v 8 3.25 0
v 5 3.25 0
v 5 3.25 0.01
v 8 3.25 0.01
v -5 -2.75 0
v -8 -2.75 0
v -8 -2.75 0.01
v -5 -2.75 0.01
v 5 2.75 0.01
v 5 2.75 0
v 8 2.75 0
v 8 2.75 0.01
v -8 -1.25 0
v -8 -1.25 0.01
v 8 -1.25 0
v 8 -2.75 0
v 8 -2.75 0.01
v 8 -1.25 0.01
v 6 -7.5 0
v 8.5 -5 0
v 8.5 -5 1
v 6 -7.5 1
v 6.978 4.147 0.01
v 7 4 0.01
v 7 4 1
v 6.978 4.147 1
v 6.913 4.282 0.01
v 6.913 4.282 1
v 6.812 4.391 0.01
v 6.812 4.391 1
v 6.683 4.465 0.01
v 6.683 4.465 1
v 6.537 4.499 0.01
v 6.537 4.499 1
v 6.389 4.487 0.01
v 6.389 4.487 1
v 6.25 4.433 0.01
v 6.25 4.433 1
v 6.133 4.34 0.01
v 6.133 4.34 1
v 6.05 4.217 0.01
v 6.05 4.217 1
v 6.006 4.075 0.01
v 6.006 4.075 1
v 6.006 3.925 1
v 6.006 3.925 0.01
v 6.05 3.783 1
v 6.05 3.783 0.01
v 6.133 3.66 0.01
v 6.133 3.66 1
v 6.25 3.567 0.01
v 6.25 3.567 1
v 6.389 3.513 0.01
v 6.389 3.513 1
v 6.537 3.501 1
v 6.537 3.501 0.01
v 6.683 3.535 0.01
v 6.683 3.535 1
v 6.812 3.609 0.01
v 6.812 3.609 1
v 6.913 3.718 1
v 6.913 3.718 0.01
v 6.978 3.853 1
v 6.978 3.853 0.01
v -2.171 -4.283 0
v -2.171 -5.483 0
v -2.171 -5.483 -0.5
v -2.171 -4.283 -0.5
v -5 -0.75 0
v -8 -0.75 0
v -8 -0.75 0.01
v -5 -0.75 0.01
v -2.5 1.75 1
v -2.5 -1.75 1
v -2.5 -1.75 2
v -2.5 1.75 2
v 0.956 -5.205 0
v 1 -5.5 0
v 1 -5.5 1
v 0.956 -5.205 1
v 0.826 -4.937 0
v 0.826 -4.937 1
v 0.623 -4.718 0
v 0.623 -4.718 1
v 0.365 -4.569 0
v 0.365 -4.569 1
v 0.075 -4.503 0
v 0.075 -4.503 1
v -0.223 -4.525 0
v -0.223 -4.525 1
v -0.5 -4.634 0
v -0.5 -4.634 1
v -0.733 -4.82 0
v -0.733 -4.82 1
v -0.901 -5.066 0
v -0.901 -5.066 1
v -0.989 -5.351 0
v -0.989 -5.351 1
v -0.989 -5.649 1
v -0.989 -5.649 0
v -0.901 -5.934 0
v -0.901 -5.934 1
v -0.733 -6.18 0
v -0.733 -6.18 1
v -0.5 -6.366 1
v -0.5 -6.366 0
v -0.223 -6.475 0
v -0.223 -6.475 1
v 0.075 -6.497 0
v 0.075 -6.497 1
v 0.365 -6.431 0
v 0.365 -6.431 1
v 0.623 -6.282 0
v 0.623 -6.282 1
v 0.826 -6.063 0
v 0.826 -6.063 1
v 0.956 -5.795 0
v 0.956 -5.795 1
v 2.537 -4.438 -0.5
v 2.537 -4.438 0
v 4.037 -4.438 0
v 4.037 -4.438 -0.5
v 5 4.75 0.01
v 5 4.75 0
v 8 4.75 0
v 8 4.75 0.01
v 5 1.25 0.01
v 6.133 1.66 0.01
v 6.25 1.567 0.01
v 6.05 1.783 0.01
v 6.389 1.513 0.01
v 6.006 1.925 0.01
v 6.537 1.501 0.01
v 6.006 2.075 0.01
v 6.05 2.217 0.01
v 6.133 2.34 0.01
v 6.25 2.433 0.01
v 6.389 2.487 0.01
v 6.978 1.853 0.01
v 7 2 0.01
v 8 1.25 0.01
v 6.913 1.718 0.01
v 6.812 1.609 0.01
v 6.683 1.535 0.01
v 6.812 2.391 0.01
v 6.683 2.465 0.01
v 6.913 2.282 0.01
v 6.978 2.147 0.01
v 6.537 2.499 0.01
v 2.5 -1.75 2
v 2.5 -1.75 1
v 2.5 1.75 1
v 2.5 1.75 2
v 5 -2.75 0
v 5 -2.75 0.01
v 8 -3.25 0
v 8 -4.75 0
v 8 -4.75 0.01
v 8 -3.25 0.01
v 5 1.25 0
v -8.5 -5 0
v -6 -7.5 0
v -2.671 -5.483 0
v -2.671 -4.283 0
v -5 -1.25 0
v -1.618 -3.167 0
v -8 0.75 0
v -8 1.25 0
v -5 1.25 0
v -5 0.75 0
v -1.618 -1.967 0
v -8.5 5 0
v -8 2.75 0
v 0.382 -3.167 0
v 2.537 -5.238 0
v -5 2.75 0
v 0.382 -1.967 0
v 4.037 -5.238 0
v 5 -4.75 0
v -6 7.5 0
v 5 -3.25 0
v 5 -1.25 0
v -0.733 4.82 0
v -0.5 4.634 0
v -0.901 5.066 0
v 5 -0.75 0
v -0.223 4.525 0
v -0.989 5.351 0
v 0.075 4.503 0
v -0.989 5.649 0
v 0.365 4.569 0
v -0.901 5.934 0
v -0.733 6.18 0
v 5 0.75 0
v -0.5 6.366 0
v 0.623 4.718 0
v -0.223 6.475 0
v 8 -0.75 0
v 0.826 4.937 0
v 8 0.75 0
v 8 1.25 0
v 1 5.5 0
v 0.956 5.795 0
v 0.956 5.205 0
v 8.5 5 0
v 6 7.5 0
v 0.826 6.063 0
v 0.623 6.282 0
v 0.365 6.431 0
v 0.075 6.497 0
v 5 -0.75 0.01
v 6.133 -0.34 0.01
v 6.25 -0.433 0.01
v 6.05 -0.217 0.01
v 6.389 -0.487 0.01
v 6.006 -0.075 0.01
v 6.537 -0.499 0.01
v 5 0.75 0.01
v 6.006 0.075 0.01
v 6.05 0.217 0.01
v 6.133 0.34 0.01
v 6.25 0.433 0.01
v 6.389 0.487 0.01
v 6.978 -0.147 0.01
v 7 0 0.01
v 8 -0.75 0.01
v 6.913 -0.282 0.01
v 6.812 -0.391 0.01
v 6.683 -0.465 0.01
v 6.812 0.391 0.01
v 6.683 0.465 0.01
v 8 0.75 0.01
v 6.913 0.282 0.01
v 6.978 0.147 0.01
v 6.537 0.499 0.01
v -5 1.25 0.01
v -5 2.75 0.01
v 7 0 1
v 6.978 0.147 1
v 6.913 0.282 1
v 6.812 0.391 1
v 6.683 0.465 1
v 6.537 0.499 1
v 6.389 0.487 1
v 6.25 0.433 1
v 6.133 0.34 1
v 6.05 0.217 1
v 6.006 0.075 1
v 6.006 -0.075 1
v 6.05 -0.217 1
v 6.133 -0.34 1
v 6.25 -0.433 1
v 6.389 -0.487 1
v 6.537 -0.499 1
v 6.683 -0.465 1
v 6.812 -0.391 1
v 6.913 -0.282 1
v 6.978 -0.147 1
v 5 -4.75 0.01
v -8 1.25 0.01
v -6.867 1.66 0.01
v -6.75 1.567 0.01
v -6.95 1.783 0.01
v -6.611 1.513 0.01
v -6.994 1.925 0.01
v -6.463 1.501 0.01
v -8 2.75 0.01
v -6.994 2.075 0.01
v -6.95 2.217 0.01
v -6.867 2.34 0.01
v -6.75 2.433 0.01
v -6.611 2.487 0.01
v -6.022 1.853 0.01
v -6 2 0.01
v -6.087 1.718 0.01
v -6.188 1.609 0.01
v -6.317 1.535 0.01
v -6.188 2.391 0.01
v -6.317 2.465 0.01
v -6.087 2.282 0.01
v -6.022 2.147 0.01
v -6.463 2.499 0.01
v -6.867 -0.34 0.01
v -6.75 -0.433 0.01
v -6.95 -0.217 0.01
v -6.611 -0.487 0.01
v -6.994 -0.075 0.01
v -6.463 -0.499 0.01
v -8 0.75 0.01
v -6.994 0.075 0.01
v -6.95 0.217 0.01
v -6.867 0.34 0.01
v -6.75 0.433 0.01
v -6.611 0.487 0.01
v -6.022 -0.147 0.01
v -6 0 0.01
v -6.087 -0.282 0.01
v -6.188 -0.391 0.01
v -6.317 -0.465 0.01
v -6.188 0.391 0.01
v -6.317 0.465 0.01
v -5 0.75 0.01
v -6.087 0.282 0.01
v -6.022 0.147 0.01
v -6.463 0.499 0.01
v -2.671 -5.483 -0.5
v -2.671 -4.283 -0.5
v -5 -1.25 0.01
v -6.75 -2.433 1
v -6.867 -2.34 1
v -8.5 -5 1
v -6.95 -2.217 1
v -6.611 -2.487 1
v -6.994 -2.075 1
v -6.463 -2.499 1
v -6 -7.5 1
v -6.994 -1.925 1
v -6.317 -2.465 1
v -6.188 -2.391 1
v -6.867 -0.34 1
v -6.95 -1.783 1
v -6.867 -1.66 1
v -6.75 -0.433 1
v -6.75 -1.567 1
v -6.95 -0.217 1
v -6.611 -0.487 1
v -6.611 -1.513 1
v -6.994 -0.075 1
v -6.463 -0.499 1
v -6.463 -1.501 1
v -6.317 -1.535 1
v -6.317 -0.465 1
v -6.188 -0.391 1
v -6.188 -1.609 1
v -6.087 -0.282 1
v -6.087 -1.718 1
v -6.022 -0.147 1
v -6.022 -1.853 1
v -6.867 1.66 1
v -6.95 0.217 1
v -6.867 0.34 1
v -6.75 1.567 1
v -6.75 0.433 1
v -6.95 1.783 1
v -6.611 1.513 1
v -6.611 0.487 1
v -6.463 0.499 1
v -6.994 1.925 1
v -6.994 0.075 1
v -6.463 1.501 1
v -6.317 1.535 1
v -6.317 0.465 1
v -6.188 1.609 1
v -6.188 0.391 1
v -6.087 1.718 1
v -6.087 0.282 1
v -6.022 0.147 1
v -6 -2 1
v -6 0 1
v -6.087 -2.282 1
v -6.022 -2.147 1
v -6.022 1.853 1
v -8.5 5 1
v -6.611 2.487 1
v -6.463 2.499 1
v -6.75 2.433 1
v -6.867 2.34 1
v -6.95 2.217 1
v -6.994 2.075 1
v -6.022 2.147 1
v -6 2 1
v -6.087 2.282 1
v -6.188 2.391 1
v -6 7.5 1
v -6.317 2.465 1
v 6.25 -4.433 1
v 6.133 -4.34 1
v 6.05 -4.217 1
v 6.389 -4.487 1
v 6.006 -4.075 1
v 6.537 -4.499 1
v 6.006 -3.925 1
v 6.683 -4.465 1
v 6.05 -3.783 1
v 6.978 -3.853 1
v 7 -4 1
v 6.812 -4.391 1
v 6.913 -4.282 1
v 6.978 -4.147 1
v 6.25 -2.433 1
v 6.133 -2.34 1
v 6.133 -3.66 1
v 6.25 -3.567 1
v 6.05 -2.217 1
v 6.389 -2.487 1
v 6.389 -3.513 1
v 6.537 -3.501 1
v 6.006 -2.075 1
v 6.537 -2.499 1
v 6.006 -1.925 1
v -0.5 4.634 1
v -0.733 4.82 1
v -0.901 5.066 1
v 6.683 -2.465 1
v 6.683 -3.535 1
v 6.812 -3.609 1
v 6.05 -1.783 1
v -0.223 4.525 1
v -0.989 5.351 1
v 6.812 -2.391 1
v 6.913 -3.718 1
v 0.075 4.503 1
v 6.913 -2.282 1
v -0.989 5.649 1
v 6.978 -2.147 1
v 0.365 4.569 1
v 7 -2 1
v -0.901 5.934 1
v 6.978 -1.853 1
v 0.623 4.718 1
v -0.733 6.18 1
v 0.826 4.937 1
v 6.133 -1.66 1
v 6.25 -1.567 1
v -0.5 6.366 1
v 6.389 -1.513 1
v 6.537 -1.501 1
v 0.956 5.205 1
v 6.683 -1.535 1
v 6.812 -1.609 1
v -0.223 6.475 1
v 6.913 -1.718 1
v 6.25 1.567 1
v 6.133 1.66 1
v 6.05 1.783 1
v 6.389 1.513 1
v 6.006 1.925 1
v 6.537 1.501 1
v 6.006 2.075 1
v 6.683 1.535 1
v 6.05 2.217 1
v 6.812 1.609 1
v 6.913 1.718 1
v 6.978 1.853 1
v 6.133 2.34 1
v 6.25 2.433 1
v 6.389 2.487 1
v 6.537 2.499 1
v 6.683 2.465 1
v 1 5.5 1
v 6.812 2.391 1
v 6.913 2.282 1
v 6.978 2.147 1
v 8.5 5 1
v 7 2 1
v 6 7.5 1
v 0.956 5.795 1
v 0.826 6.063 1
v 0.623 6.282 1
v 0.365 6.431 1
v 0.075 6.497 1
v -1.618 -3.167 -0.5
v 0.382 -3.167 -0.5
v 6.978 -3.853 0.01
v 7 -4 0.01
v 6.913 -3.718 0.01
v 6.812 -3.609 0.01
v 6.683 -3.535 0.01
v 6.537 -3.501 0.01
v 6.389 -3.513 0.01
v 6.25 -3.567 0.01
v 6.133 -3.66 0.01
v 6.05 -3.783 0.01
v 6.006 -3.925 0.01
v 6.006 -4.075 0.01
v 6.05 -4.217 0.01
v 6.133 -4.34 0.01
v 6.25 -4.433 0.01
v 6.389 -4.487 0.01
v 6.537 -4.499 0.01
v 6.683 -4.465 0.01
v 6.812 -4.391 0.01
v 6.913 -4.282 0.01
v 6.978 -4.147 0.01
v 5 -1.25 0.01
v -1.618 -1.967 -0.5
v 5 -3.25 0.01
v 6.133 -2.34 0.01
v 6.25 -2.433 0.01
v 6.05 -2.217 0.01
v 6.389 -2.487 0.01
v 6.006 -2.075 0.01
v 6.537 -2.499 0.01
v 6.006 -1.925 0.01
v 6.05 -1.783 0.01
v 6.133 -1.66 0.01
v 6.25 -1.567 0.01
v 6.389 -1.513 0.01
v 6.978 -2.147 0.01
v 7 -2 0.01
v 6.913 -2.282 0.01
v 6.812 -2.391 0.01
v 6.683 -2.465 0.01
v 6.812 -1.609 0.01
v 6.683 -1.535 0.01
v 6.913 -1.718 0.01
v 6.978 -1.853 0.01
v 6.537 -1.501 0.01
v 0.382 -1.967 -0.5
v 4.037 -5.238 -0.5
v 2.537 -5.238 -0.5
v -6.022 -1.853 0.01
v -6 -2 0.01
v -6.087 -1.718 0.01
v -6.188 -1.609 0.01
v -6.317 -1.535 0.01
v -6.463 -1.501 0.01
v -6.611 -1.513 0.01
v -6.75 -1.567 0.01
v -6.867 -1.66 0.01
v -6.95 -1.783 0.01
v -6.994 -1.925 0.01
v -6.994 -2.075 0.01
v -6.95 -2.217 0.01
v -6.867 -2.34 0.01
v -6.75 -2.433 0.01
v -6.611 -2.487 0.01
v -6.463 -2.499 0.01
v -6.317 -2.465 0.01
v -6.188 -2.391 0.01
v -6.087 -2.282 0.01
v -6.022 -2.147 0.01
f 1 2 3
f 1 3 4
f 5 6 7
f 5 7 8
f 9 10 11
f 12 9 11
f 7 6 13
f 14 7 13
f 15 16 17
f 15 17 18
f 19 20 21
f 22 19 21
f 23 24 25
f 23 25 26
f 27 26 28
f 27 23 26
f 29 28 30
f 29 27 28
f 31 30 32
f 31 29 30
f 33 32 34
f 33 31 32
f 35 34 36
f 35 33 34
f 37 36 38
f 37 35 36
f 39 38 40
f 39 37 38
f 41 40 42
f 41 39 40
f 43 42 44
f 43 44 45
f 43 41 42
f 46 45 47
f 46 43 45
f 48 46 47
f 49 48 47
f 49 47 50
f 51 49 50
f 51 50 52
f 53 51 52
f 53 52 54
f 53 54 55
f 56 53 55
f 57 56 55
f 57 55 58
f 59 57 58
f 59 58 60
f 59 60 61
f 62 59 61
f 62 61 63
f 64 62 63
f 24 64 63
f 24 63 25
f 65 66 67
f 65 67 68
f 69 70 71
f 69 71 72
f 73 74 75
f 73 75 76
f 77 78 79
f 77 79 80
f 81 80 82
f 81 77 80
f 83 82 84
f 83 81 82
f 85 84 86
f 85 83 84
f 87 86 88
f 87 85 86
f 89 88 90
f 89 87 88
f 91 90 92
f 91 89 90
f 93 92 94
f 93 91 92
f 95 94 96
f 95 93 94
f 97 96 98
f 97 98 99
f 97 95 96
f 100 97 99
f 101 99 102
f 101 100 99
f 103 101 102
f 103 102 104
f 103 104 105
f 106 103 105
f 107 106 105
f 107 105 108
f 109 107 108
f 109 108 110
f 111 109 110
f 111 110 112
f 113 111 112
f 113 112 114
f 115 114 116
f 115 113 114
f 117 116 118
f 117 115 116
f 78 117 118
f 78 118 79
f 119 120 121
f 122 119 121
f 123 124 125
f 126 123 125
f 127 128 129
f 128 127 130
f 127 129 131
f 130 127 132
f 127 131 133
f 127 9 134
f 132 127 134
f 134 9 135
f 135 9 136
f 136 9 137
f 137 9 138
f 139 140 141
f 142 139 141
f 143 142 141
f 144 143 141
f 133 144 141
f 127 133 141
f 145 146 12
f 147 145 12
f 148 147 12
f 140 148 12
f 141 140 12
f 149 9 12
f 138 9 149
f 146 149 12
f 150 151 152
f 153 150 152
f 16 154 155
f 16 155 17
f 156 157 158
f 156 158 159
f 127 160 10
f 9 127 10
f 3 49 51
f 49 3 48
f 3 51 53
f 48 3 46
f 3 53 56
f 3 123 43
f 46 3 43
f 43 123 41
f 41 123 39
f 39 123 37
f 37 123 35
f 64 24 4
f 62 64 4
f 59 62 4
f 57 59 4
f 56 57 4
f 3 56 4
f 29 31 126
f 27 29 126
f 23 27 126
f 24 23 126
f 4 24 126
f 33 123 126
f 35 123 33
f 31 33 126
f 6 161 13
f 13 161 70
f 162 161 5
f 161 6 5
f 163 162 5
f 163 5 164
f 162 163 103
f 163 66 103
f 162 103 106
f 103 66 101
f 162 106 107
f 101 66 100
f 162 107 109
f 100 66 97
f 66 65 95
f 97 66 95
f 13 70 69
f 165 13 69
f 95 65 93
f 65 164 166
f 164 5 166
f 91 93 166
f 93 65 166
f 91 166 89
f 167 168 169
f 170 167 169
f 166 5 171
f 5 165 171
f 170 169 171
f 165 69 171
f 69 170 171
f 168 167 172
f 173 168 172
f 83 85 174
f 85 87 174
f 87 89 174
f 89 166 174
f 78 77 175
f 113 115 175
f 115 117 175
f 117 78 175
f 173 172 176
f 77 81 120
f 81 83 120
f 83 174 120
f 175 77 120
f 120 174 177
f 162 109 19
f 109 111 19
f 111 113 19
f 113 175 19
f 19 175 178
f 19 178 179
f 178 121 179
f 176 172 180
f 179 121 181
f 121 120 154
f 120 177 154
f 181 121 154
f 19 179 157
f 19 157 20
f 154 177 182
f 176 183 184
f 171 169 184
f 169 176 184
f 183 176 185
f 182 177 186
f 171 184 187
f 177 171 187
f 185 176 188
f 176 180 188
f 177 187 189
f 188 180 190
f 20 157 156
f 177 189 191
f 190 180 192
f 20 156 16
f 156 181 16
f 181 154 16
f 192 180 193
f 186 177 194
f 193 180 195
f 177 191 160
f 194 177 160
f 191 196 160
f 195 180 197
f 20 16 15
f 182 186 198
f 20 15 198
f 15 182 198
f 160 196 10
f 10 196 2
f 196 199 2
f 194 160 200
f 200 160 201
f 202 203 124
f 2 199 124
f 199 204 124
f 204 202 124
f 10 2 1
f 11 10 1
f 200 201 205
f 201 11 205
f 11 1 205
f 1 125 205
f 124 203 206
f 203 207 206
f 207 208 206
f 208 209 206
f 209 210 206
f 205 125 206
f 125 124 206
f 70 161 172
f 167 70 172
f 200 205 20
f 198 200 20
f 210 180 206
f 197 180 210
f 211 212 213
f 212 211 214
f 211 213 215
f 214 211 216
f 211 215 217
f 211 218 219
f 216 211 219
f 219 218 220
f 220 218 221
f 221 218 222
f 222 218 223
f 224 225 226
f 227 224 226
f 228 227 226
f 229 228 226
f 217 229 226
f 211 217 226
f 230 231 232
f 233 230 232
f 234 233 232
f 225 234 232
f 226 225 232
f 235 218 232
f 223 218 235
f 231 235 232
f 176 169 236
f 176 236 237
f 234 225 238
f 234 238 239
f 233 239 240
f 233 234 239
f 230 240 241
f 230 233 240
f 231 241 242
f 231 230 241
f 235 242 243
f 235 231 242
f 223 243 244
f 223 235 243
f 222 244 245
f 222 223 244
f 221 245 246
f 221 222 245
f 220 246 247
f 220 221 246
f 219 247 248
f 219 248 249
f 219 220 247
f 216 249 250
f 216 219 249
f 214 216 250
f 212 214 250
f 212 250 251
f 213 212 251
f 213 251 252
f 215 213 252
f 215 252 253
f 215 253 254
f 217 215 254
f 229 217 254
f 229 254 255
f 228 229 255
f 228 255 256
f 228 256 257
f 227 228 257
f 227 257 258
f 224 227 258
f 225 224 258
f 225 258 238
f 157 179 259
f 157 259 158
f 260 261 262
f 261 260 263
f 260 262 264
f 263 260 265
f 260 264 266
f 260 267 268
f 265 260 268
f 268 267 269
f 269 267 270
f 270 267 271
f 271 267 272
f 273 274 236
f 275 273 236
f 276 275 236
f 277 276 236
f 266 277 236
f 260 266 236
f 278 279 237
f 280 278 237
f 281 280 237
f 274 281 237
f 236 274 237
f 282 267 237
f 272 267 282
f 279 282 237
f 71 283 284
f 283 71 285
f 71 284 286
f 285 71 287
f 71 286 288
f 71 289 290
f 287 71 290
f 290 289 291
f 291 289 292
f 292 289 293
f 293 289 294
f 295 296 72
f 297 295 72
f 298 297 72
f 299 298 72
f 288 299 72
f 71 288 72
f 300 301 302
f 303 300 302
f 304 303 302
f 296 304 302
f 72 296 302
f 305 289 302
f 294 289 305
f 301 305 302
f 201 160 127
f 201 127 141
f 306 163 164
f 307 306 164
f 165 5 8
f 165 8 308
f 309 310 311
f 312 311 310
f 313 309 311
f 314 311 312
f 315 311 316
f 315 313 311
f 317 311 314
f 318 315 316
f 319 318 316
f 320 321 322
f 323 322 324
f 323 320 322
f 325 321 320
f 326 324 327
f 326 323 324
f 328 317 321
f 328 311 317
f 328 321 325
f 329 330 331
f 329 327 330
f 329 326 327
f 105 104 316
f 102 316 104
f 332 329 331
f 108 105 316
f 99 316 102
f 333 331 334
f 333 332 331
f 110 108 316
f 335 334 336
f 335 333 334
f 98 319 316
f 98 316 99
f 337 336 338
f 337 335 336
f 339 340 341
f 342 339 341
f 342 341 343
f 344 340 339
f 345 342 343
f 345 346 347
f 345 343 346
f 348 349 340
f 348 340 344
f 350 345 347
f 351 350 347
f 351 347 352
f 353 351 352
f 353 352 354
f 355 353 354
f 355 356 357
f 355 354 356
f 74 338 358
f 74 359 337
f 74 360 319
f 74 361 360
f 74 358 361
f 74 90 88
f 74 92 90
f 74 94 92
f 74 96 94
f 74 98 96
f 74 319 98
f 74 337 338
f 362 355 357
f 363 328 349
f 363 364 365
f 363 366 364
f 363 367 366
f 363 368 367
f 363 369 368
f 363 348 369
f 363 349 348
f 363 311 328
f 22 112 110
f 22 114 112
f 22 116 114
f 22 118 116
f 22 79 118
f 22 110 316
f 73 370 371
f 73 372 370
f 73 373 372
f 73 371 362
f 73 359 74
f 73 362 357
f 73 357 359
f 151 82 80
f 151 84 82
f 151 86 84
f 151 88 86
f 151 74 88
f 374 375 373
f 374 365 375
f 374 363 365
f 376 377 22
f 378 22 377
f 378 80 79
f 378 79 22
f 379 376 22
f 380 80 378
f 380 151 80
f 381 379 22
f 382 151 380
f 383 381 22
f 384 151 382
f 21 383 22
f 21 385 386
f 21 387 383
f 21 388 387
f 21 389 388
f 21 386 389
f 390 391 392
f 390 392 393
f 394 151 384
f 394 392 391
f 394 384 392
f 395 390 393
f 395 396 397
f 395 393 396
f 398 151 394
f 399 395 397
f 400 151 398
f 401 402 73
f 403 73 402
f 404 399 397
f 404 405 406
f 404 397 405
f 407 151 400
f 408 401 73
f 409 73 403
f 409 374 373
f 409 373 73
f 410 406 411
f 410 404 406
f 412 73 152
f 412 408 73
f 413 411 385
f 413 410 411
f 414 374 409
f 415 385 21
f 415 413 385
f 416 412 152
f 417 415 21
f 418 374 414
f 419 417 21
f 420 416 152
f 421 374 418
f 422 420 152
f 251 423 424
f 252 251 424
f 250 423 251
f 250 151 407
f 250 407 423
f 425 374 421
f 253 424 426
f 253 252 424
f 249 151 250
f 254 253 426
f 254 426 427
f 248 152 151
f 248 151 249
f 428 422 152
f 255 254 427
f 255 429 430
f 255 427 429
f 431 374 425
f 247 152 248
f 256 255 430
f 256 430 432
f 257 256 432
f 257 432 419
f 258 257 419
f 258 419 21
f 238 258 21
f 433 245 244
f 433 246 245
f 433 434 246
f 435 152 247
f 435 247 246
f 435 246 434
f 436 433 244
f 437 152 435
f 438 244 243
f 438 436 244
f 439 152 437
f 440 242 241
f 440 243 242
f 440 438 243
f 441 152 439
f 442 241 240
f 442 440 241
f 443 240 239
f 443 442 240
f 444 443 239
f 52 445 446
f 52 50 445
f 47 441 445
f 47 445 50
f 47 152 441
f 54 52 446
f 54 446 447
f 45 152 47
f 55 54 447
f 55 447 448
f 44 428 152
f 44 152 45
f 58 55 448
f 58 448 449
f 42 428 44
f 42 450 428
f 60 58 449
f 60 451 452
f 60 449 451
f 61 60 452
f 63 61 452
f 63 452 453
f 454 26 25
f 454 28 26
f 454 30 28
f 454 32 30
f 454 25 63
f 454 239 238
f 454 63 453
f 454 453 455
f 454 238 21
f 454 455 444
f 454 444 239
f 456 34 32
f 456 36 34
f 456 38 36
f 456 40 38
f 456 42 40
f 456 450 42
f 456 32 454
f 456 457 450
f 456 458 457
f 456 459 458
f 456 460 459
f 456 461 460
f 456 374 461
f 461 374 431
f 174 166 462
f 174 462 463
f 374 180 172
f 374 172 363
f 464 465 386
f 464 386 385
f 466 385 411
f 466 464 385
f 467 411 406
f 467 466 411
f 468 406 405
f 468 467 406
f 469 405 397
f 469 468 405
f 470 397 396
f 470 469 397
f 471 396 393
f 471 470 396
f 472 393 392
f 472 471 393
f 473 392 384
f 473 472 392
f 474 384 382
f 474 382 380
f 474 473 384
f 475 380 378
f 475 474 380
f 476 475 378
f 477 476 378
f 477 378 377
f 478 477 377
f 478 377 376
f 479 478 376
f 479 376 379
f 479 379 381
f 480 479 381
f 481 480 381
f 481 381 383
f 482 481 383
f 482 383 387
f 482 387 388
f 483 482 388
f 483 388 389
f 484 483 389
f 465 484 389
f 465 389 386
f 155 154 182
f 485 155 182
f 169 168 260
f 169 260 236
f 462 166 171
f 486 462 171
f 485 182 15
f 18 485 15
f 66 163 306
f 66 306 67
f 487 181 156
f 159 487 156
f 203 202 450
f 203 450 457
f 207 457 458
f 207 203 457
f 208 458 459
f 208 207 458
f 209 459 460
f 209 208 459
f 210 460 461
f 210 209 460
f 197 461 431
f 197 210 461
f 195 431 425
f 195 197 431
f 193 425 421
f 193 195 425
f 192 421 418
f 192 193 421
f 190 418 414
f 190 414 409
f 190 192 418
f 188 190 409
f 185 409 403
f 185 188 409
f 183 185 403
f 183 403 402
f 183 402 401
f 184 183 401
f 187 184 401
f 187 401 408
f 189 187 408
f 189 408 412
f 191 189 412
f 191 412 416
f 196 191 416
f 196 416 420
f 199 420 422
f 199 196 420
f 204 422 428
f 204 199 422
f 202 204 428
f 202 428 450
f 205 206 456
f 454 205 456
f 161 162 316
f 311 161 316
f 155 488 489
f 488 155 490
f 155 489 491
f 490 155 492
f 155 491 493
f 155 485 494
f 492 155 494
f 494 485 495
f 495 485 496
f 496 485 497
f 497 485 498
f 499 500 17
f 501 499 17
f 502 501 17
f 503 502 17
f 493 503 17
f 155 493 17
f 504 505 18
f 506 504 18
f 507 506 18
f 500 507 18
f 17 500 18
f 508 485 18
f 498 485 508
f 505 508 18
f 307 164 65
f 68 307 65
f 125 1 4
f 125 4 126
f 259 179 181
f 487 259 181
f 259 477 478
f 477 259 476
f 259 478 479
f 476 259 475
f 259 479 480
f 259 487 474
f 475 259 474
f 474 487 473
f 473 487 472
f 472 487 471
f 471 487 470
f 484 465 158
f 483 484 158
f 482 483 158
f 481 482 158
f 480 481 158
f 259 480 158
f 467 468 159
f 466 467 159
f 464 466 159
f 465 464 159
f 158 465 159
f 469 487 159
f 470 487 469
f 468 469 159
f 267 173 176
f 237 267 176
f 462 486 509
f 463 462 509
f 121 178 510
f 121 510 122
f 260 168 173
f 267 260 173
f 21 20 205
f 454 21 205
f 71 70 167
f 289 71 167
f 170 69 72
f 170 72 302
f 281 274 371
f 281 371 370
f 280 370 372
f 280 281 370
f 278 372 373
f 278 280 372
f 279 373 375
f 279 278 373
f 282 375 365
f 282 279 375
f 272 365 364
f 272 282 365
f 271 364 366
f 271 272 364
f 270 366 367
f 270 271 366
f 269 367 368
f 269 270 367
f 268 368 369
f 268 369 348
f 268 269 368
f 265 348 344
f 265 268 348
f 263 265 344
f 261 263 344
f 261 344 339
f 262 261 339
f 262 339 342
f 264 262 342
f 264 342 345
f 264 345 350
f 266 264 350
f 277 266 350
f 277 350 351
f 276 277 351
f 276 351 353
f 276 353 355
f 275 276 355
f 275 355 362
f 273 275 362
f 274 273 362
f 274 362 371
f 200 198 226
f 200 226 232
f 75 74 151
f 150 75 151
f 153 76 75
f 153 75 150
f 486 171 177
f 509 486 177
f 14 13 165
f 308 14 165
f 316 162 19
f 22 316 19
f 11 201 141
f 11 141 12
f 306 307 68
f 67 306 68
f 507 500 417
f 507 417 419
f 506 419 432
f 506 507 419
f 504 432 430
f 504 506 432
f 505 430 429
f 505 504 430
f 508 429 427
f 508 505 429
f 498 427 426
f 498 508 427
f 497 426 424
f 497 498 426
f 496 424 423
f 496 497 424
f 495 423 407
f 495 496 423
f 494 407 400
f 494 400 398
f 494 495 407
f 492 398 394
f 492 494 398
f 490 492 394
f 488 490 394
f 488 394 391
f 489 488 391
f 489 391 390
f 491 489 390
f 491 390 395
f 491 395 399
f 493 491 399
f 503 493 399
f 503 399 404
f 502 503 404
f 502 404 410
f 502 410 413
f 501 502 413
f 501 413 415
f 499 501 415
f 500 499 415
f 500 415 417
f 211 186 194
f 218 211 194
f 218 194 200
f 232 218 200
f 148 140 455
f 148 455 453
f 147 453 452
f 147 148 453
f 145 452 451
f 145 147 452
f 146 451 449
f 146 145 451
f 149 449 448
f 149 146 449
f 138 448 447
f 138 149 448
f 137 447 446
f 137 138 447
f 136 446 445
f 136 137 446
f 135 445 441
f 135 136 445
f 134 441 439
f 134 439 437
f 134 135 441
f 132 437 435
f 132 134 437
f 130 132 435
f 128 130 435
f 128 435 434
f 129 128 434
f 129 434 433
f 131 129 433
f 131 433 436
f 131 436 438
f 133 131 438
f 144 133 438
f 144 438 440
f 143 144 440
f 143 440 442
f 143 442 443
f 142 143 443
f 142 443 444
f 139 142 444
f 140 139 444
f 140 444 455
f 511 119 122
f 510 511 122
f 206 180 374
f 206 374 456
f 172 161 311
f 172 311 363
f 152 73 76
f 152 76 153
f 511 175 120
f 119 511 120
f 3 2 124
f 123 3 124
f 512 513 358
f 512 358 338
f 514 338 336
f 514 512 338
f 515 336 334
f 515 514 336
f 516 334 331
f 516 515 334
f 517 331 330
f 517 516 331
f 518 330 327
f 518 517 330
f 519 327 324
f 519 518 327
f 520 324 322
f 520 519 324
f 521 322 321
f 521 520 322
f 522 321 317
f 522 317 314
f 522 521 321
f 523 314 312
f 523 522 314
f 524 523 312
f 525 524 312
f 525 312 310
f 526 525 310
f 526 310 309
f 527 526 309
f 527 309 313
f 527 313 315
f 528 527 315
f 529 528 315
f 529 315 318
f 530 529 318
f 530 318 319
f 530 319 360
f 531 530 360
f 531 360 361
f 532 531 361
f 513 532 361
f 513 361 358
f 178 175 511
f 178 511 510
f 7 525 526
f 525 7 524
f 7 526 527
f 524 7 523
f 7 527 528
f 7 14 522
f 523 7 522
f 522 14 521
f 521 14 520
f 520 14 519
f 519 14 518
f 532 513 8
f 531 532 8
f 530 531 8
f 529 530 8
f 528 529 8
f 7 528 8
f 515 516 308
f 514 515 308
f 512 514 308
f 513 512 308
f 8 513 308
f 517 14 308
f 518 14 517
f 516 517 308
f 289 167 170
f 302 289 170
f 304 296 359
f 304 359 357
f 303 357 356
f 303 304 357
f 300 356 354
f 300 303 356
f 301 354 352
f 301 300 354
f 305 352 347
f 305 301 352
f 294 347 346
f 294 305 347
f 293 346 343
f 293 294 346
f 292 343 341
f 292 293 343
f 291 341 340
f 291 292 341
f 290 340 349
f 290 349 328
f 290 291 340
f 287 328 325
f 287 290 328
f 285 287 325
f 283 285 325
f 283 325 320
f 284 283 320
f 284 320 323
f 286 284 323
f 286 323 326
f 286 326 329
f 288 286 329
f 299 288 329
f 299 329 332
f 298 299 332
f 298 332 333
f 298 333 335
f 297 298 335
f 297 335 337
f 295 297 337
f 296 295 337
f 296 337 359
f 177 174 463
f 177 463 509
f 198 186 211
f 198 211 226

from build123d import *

# Parameters (mm, degrees)
SKETCH1_W           = 17
SKETCH1_H           = 15
BOSS_EXTRUDE1_DEPTH = 1
CHAMFER1_SIZE       = 2.5
BOSS_EXTRUDE2_START = 1
SKETCH2_W           = 5
SKETCH2_H           = 3.5
BOSS_EXTRUDE2_DEPTH = 1
SKETCH3_R           = 1
SKETCH3_R_2         = 0.5
CUT_EXTRUDE1_DEPTH  = 1
SKETCH4_W           = 2
SKETCH4_H           = 1.2
SKETCH4_W_2         = 0.5
SKETCH4_W_3         = 1.5
SKETCH4_H_2         = 0.8
BOSS_EXTRUDE3_DEPTH = 0.5
SKETCH5_W           = 3
SKETCH5_H           = 1.5
CUT_EXTRUDE2_DEPTH  = 0.01


with BuildPart() as part:
    # Sketch1 → Boss-Extrude1 (new body)
    with BuildSketch(Plane.XY):
        Rectangle(SKETCH1_W, SKETCH1_H)
    extrude(amount=BOSS_EXTRUDE1_DEPTH)

    # Chamfer1
    chamfer1_edges = [part.edges().sort_by_distance(p)[0] for p in [
        (8.5, -7.5, 0.5),
        (-8.5, -7.5, 0.5),
        (-8.5, 7.5, 0.5),
        (8.5, 7.5, 0.5),
    ]]
    chamfer(chamfer1_edges, length=CHAMFER1_SIZE)

    # Sketch2 → Boss-Extrude2 (add)
    with BuildSketch(Plane.XY.offset(BOSS_EXTRUDE2_START)):
        Rectangle(SKETCH2_W, SKETCH2_H)
    extrude(amount=BOSS_EXTRUDE2_DEPTH)

    # Sketch3 → Cut-Extrude1 (cut)
    with BuildSketch(Plane.XY):
        with Locations((0, 5.5)):
            Circle(SKETCH3_R)
        with Locations((0, -5.5)):
            Circle(SKETCH3_R)
        with Locations((6.5, 0)):
            Circle(SKETCH3_R_2)
        with Locations((-6.5, 0)):
            Circle(SKETCH3_R_2)
        with Locations((6.5, 2)):
            Circle(SKETCH3_R_2)
        with Locations((6.5, 4)):
            Circle(SKETCH3_R_2)
        with Locations((-6.5, 2)):
            Circle(SKETCH3_R_2)
        with Locations((-6.5, -2)):
            Circle(SKETCH3_R_2)
        with Locations((6.5, -4)):
            Circle(SKETCH3_R_2)
        with Locations((6.5, -2)):
            Circle(SKETCH3_R_2)
    extrude(amount=CUT_EXTRUDE1_DEPTH, mode=Mode.SUBTRACT)

    # Sketch4 → Boss-Extrude3 (add)
    with BuildSketch(Plane.XY):
        with Locations((-0.618205111, -2.566679178)):
            Rectangle(SKETCH4_W, SKETCH4_H)
        with Locations((-2.420773885, -4.883367435)):
            Rectangle(SKETCH4_W_2, SKETCH4_H)
        with Locations((3.286986257, -4.838471609)):
            Rectangle(SKETCH4_W_3, SKETCH4_H_2)
    extrude(amount=-BOSS_EXTRUDE3_DEPTH)

    # Sketch5 → Cut-Extrude2 (cut)
    with BuildSketch(Plane.XY):
        with Locations((6.5, -4)):
            Rectangle(SKETCH5_W, SKETCH5_H)
        with Locations((6.5, -2)):
            Rectangle(SKETCH5_W, SKETCH5_H)
        with Locations((6.5, 0)):
            Rectangle(SKETCH5_W, SKETCH5_H)
        with Locations((6.5, 2)):
            Rectangle(SKETCH5_W, SKETCH5_H)
        with Locations((6.5, 4)):
            Rectangle(SKETCH5_W, SKETCH5_H)
        with Locations((-6.5, -2)):
            Rectangle(SKETCH5_W, SKETCH5_H)
        with Locations((-6.5, 0)):
            Rectangle(SKETCH5_W, SKETCH5_H)
        with Locations((-6.5, 2)):
            Rectangle(SKETCH5_W, SKETCH5_H)
    extrude(amount=CUT_EXTRUDE2_DEPTH, mode=Mode.SUBTRACT)


solid = part.part
